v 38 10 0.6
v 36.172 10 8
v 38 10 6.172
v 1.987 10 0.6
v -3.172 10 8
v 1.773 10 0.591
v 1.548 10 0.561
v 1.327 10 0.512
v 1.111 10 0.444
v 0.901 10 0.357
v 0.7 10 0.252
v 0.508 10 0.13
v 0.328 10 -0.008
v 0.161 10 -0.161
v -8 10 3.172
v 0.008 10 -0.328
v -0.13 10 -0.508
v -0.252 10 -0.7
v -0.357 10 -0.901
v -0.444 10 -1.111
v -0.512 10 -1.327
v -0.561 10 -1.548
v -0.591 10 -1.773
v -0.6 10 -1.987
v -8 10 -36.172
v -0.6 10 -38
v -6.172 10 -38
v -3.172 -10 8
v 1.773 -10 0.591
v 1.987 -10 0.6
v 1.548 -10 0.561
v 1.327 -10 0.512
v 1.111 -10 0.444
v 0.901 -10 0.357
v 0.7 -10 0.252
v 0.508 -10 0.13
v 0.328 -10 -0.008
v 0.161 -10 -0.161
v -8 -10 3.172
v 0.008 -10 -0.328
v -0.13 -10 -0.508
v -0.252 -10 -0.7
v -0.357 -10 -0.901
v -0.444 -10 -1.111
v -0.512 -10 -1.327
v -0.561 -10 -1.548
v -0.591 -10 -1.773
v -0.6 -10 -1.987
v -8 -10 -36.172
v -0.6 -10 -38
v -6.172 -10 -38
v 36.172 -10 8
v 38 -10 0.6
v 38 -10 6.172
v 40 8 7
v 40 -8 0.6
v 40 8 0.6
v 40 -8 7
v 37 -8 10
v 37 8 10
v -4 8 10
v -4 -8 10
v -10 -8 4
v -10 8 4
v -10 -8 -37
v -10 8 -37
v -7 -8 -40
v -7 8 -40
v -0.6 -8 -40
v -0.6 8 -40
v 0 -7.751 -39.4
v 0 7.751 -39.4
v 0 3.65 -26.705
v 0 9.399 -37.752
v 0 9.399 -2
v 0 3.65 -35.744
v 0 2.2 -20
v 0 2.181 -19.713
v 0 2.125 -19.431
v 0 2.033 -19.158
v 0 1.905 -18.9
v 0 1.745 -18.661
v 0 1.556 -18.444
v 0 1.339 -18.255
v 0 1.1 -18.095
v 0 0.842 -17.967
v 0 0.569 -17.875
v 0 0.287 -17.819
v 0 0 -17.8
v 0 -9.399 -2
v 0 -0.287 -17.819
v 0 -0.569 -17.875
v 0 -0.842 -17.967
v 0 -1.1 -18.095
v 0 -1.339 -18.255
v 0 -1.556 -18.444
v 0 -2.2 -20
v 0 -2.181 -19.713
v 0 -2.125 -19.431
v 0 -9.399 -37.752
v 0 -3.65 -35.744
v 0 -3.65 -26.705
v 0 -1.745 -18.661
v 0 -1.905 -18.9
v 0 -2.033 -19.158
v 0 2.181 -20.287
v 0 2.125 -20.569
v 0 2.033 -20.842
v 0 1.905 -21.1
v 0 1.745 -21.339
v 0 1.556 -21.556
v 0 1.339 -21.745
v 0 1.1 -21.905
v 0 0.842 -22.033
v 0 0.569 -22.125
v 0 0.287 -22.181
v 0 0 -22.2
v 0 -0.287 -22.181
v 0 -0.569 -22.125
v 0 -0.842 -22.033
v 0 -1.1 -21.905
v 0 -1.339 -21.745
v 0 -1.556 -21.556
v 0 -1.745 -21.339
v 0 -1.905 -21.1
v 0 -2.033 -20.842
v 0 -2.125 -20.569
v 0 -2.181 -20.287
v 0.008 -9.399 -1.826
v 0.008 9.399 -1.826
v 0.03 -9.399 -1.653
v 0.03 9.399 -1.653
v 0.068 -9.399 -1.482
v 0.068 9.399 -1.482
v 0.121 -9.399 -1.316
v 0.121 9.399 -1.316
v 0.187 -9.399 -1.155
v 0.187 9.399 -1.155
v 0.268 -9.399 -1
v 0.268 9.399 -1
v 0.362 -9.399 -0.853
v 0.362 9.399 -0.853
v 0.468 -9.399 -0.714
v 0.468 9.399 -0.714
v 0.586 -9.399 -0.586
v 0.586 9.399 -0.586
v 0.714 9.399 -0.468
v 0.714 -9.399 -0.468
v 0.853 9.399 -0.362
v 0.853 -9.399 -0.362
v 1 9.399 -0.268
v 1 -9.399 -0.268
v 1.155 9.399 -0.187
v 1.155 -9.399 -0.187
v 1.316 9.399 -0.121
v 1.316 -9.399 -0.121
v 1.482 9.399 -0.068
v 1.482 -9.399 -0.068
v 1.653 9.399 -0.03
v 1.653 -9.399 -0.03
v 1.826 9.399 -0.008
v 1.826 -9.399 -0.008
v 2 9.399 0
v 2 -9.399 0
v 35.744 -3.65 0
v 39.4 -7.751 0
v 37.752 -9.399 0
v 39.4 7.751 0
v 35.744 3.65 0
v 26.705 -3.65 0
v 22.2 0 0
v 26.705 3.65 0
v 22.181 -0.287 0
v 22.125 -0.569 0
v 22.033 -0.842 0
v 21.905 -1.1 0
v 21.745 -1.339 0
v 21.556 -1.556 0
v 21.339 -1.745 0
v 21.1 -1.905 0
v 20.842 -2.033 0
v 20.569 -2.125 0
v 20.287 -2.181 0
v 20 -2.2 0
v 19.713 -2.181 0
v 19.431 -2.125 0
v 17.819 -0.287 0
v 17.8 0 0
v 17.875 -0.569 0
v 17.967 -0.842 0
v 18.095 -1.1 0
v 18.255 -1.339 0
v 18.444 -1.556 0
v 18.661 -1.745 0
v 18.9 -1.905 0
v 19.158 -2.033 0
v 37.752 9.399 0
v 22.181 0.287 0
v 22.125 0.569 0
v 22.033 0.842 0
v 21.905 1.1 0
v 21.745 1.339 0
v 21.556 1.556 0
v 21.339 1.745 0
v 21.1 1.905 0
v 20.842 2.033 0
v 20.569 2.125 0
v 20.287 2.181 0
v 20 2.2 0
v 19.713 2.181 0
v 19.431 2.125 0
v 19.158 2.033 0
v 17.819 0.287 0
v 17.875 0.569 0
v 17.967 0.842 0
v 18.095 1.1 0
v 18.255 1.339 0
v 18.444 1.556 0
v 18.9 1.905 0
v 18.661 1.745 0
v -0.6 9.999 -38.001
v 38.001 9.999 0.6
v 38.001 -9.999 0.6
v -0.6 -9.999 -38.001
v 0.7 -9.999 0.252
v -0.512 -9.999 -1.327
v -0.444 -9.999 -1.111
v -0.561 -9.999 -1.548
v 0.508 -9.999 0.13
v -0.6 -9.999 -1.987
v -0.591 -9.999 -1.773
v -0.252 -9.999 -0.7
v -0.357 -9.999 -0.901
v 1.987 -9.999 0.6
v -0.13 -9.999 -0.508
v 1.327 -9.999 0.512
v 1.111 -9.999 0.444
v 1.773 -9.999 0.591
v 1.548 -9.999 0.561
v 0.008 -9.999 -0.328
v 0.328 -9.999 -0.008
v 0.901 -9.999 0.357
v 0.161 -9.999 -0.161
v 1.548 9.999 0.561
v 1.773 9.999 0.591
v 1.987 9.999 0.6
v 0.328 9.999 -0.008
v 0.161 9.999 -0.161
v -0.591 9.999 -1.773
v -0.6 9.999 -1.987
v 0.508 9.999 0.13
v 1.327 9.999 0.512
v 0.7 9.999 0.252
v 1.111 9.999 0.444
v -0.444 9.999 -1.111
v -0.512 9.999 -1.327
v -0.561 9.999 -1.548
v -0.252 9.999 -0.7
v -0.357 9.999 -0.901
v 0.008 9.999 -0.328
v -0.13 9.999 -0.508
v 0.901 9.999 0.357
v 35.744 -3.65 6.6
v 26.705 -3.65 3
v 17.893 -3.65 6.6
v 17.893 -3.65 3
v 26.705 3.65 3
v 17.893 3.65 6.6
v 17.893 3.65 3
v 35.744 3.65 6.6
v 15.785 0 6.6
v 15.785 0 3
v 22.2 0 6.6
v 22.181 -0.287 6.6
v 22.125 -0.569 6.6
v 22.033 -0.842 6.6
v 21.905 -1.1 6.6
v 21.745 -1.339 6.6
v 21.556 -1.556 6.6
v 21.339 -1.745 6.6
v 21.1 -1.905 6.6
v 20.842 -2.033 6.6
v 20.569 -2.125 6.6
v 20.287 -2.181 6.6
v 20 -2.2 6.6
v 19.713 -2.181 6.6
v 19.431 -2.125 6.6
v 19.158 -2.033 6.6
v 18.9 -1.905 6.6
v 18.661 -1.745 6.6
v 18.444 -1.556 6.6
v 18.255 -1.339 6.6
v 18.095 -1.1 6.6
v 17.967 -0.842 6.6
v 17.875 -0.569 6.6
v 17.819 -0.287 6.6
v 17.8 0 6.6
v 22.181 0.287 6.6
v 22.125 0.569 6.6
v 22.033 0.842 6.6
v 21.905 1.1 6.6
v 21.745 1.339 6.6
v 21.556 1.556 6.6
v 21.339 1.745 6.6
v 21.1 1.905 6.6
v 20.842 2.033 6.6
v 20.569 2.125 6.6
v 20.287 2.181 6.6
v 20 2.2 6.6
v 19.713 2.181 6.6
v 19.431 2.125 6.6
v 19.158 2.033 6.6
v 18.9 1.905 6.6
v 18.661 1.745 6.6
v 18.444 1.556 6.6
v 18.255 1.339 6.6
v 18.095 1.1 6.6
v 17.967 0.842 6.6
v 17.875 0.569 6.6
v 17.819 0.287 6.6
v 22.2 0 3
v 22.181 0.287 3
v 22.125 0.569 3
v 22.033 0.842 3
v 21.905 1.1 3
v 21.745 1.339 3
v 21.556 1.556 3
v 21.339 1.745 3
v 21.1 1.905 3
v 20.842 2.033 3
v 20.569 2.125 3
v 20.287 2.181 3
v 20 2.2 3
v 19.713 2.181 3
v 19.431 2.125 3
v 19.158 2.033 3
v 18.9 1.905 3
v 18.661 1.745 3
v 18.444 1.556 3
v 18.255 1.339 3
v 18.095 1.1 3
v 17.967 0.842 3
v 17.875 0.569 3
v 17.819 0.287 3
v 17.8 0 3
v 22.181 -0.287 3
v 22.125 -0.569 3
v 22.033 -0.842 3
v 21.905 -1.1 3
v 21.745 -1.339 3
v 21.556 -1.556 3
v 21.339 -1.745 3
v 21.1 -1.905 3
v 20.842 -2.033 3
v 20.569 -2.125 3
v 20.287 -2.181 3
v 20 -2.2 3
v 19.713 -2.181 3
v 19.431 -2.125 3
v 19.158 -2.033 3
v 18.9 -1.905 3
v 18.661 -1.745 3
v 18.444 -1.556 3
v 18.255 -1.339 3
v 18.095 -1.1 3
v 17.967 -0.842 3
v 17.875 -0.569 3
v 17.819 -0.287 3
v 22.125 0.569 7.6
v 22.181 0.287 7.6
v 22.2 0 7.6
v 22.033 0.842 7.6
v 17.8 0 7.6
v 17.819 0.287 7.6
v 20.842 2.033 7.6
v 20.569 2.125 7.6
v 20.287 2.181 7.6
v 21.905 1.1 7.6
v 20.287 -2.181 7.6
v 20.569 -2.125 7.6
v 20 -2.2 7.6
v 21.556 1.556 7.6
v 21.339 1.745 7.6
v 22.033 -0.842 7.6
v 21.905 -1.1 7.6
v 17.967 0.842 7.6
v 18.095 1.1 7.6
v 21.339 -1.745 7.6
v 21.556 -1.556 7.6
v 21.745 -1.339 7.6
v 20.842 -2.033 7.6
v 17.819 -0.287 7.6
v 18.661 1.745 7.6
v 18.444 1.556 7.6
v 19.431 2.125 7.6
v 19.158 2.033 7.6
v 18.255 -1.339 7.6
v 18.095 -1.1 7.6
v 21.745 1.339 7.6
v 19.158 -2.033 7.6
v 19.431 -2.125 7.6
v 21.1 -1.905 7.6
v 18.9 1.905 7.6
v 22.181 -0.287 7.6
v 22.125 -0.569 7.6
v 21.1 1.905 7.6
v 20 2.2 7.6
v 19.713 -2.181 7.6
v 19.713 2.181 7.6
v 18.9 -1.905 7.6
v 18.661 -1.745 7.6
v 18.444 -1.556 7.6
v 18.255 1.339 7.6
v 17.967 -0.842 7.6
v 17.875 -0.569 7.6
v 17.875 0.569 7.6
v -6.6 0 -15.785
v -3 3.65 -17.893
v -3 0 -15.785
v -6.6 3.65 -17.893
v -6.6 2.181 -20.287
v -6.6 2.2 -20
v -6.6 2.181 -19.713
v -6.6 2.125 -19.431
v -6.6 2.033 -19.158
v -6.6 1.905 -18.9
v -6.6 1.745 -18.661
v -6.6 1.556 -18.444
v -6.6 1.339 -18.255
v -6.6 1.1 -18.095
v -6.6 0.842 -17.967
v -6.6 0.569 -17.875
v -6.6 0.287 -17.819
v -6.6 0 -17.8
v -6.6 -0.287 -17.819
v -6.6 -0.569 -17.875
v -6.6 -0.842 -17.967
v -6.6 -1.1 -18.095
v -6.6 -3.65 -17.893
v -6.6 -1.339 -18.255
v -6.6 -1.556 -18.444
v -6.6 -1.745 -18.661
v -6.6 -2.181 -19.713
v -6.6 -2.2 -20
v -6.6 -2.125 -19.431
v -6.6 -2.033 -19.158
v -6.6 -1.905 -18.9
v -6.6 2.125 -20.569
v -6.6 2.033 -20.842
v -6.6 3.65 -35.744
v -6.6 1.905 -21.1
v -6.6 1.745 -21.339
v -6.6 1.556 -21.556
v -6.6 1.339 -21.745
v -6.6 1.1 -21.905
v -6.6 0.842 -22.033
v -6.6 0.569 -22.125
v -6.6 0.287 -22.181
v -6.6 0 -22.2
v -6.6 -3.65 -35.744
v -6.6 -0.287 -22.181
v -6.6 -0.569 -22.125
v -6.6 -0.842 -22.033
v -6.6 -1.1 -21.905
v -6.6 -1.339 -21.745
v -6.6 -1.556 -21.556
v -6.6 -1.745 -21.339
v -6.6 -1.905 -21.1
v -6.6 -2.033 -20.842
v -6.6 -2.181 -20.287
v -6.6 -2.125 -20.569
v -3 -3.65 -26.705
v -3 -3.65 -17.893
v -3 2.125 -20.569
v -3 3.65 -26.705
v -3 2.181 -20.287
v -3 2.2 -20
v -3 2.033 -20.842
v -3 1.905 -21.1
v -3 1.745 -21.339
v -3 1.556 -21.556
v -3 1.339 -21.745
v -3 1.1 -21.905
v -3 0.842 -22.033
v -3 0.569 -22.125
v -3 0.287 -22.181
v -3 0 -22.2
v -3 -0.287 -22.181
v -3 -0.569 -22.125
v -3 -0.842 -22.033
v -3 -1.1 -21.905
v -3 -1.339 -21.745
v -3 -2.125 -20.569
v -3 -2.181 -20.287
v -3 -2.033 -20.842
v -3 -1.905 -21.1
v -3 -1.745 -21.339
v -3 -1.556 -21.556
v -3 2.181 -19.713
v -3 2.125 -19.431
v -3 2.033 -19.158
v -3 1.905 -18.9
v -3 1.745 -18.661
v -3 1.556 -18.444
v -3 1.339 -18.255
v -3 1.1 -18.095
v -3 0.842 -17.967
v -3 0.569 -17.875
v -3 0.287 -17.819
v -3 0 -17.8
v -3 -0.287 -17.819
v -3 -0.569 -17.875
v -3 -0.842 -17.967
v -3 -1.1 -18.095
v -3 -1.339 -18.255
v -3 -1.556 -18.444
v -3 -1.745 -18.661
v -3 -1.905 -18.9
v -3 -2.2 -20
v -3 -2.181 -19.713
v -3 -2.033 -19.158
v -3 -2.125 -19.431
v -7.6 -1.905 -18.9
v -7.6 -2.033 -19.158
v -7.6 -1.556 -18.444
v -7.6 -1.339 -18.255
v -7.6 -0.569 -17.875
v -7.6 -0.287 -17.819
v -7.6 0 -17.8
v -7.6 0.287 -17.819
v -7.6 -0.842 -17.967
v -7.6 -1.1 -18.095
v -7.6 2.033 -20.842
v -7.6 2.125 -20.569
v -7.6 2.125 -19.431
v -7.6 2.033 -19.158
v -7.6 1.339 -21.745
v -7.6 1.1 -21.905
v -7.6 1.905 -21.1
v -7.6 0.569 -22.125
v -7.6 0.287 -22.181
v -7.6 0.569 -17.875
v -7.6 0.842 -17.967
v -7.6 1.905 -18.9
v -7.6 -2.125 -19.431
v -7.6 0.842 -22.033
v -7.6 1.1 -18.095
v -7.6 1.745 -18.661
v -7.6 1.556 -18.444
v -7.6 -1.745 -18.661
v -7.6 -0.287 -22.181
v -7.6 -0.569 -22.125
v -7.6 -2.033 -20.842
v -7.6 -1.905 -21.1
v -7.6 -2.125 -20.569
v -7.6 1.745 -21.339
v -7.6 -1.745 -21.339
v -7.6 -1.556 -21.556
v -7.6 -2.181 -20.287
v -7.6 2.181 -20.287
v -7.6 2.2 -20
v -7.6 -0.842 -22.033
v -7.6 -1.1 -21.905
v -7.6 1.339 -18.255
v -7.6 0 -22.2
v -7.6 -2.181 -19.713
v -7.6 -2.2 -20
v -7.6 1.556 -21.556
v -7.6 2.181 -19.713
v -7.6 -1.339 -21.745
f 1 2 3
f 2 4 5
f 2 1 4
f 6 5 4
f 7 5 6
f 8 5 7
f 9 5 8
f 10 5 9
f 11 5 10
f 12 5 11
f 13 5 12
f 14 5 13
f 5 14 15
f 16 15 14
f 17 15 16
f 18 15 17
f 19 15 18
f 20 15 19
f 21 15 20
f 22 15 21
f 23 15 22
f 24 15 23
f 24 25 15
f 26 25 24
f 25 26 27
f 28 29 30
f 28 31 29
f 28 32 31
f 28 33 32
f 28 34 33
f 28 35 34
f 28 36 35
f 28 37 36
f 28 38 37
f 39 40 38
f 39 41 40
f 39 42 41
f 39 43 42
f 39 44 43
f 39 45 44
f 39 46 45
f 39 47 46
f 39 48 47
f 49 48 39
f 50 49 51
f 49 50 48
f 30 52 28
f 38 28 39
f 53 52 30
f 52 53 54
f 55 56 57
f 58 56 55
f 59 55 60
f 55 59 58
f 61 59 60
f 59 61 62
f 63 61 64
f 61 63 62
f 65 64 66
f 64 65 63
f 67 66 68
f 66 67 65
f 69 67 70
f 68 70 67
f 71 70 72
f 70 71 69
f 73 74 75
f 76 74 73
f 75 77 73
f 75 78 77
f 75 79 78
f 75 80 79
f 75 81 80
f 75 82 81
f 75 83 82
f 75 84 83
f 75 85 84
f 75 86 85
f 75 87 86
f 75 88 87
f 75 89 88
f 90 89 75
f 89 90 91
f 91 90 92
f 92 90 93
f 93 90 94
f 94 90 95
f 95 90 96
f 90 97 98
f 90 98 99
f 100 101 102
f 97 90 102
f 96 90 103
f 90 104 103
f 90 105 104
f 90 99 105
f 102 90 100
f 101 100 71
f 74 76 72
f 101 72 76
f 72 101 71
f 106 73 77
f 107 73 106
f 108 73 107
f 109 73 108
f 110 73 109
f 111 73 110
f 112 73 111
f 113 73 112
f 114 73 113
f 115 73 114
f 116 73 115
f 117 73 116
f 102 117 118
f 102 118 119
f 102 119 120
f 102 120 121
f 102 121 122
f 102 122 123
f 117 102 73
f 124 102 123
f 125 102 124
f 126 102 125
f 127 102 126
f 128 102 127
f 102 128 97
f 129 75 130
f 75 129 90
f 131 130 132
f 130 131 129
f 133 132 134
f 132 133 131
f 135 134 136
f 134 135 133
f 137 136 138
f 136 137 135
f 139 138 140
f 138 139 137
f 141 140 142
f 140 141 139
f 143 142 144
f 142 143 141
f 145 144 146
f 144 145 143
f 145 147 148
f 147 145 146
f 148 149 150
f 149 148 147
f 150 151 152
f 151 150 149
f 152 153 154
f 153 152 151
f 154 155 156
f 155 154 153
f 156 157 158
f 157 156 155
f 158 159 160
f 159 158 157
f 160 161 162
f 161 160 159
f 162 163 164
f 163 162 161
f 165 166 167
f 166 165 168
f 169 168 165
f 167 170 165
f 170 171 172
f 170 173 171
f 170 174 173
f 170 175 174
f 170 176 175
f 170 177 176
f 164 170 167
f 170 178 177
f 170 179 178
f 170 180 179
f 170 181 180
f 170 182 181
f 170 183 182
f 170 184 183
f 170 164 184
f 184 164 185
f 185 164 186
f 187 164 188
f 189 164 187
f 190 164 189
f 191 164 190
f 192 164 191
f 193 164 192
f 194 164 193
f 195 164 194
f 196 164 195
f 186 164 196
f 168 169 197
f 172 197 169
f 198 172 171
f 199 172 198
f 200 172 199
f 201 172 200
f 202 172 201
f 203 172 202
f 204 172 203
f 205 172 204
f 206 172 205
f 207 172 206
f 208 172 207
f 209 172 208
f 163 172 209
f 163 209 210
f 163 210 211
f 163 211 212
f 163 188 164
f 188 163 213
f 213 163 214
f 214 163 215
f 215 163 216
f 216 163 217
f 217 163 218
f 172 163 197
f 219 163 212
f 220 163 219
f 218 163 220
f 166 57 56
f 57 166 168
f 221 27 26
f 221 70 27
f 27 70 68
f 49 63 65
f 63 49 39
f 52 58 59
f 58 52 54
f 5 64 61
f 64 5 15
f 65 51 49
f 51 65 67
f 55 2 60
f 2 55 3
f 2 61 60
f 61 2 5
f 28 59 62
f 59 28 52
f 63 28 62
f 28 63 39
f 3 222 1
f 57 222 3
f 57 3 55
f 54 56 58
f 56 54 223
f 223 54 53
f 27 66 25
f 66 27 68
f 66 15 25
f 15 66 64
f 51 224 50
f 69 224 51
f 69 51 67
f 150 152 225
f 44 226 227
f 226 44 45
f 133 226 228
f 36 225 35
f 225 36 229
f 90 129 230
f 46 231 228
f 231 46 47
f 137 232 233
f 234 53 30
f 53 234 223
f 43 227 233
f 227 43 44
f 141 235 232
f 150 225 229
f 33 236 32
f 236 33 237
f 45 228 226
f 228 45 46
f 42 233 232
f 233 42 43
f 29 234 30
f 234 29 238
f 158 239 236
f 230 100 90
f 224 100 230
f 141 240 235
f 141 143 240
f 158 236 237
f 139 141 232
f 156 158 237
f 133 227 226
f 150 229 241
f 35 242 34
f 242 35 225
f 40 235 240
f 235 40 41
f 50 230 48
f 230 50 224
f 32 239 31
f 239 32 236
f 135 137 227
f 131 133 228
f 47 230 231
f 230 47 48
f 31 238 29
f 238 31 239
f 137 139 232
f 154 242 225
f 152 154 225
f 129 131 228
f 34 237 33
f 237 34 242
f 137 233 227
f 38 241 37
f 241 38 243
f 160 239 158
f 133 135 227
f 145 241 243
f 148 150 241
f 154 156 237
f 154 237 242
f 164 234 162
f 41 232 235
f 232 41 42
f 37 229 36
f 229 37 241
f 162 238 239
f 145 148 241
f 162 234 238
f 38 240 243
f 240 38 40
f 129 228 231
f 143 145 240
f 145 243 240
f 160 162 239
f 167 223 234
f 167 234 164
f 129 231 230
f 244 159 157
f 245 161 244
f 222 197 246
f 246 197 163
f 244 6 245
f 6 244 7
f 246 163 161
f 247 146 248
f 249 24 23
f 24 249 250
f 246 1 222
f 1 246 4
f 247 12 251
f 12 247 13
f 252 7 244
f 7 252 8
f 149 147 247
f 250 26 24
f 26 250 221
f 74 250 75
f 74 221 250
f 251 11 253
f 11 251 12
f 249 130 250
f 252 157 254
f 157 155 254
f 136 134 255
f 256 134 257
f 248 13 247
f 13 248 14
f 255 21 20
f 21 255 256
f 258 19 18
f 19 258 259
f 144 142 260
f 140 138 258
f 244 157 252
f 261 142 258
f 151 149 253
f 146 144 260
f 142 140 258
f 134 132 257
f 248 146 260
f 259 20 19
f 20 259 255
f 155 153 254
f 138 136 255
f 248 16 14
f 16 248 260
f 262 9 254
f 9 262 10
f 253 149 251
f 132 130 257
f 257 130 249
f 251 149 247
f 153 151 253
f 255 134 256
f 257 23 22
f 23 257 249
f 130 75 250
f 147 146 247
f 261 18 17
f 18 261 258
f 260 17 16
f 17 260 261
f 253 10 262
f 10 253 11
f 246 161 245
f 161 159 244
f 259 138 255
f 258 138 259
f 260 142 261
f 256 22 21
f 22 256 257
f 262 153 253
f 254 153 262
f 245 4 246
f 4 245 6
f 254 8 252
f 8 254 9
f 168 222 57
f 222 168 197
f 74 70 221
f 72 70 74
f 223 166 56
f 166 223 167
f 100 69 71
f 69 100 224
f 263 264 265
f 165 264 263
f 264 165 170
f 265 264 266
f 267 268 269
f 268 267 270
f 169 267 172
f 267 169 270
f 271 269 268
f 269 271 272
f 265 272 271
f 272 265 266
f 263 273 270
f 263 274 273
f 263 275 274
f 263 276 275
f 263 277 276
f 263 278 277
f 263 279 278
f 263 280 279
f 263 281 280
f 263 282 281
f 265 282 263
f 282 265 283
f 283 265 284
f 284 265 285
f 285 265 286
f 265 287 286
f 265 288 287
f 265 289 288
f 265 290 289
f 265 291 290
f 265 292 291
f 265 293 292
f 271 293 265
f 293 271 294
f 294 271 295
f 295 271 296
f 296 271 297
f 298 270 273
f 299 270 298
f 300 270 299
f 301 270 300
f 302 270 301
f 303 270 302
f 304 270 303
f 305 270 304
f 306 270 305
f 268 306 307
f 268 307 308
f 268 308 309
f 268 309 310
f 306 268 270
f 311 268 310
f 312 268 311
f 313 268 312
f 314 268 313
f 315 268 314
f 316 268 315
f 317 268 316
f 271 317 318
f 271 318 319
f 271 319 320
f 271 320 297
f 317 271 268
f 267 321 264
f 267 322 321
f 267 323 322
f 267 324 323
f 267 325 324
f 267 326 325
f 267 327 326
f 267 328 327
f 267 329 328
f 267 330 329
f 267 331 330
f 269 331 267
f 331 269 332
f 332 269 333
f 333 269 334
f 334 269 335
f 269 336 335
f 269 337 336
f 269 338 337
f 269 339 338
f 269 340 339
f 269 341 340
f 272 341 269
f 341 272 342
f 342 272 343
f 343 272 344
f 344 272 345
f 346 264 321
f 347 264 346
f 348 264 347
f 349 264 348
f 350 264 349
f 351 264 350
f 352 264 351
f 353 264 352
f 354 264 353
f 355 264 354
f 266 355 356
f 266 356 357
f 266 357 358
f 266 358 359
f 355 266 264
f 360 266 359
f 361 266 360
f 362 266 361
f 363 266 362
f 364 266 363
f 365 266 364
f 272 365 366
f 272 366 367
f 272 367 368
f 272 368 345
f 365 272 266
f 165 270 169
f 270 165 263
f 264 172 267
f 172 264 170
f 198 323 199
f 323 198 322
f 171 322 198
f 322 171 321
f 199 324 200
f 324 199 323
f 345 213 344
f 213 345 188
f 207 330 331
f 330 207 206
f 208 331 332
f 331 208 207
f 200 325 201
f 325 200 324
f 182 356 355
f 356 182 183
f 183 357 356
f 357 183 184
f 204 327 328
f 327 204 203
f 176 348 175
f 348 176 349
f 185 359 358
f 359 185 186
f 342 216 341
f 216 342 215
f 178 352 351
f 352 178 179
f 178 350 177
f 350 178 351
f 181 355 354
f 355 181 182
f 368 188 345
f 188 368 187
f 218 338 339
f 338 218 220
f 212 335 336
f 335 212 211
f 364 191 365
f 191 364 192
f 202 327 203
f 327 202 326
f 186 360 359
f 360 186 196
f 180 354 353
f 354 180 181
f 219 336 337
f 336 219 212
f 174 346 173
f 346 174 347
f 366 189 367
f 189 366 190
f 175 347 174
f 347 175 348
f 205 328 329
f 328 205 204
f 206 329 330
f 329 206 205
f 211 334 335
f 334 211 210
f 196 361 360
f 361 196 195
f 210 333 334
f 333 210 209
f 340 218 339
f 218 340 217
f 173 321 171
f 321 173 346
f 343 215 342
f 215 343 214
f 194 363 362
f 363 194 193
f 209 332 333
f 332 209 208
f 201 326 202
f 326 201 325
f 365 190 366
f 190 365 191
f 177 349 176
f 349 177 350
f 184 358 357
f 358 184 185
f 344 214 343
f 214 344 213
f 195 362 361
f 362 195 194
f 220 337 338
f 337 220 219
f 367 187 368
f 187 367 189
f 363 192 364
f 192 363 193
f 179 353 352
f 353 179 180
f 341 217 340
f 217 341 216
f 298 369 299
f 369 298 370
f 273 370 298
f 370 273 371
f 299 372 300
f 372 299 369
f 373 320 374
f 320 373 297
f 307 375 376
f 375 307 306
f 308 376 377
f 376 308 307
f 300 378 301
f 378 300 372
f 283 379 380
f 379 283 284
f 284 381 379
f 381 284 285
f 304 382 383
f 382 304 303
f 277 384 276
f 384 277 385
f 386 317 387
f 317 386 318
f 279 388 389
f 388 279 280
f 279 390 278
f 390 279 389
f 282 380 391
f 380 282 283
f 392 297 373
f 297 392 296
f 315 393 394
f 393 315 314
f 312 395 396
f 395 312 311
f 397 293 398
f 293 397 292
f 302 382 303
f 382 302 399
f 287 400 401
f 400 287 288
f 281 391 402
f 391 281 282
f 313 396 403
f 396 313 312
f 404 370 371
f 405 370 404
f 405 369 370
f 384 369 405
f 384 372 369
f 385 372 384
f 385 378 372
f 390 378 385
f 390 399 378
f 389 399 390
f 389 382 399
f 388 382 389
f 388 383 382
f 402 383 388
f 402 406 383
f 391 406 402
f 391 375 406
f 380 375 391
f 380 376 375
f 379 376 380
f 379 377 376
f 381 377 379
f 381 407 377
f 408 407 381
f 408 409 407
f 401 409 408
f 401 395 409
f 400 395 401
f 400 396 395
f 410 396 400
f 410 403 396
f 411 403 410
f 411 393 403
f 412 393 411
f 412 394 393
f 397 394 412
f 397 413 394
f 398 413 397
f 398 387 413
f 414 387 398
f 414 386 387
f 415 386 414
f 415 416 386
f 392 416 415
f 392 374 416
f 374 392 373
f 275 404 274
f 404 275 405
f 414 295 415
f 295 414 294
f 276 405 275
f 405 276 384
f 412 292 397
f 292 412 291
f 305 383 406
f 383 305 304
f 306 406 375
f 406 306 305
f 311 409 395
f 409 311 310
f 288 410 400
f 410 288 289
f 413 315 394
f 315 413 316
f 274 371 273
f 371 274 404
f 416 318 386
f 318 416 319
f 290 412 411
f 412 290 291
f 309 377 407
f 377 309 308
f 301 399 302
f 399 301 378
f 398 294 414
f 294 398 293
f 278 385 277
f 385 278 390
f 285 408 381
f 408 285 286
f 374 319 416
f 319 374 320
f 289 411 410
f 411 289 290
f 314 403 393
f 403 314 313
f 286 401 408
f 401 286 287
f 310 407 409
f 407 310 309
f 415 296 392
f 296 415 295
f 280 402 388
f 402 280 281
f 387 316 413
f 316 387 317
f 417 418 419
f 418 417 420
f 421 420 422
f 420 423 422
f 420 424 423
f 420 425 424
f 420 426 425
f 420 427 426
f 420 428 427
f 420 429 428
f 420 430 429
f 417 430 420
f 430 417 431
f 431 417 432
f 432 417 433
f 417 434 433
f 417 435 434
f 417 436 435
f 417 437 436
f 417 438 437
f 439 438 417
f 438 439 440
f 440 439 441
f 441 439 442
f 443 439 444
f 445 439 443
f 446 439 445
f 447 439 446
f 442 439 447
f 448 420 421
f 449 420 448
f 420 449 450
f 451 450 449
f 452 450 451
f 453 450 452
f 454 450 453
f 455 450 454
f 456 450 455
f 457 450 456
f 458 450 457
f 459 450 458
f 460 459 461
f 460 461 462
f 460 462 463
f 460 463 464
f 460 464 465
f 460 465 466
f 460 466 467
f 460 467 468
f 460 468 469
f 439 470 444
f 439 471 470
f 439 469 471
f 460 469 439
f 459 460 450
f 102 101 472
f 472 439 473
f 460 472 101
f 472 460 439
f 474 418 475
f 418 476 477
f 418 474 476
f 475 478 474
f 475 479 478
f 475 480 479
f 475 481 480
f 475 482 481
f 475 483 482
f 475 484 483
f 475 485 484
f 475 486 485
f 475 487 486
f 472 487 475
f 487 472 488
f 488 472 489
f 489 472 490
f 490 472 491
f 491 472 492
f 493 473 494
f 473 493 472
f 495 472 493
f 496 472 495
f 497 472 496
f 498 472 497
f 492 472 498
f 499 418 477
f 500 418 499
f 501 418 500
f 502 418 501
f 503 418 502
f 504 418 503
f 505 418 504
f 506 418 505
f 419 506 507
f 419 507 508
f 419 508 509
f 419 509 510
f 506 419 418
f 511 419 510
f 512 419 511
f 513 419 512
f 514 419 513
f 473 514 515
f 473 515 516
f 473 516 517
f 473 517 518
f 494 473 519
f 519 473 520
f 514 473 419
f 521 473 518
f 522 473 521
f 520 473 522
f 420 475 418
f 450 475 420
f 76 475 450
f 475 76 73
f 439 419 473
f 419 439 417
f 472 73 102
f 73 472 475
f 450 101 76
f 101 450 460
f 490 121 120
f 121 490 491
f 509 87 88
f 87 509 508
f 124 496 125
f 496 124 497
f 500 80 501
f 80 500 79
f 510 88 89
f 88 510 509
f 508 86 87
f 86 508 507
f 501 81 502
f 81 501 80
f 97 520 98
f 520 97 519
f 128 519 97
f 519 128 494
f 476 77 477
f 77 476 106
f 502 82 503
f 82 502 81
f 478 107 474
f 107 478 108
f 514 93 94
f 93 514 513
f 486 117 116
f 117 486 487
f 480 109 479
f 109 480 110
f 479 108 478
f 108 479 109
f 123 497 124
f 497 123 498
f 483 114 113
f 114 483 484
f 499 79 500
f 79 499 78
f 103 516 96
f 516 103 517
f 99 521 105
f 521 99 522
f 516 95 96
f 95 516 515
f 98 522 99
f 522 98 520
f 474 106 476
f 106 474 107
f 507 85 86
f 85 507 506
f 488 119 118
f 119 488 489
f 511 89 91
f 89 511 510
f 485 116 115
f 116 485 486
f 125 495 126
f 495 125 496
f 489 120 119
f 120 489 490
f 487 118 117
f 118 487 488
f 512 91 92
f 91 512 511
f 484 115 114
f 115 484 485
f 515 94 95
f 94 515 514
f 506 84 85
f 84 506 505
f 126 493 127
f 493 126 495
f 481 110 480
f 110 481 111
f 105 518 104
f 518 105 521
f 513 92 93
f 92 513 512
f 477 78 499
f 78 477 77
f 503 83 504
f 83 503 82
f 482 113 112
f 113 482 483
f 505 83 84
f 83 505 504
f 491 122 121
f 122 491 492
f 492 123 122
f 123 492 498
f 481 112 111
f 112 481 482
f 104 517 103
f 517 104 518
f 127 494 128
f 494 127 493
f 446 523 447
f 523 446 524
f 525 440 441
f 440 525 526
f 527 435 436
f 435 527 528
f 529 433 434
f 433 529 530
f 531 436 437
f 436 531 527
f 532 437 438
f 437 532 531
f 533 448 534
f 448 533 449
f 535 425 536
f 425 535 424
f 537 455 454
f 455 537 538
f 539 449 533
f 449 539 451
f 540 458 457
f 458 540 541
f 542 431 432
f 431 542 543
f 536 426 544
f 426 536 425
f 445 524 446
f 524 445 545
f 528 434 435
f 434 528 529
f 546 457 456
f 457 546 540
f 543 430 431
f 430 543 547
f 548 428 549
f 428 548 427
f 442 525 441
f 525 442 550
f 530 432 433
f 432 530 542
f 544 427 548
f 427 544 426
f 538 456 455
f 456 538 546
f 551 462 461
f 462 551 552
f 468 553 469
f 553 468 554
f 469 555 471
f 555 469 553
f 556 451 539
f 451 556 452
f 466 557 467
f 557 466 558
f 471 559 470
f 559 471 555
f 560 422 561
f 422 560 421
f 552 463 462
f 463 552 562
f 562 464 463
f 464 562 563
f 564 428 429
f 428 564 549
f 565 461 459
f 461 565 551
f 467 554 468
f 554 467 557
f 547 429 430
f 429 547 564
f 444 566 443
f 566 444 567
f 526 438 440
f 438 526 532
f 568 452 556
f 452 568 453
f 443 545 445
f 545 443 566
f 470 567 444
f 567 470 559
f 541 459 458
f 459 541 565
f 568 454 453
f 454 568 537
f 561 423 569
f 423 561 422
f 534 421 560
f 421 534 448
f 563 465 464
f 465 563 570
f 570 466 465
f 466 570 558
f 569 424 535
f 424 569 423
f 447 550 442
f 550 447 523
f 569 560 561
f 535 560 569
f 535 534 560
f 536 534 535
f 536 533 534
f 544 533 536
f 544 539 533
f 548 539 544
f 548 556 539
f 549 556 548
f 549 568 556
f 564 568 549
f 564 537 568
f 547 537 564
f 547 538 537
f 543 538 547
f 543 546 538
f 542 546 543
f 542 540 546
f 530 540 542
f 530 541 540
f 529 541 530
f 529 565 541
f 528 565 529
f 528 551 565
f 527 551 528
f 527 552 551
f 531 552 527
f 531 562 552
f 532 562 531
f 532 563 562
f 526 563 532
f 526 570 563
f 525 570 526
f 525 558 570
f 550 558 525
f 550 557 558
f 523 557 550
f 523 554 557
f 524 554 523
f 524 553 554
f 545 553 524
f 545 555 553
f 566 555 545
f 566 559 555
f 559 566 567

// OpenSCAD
// file: inspection.scad
// Optional section clipping for OpenSCAD Customizer inspection.
// The bracket's default "None" mode passes the geometry through unchanged.
// For X/Y/Z, intersect geometry with a slab of the requested depth in mm.
module util_section_inspect(axis = "None", position_mm = 0, depth_mm = 10, direction = "Positive") {
    if (axis == "None")
        children();
    else {
        extent = 10000;
        low = (direction == "Negative") ? position_mm - depth_mm : position_mm;
        intersection() {
            children();
            if (axis == "X")
                translate([low, -extent / 2, -extent / 2])
                    cube([depth_mm, extent, extent]);
            else if (axis == "Y")
                translate([-extent / 2, low, -extent / 2])
                    cube([extent, depth_mm, extent]);
            else if (axis == "Z")
                translate([-extent / 2, -extent / 2, low])
                    cube([extent, extent, depth_mm]);
        }
    }
}
// main file
// Outside-corner L bracket for plywood joints.
// All dimensions are in millimetres. Adjust settings in the OpenSCAD Customizer.
//
// Side view (X to the right, Z upwards), with wood inside the bracket:
//
//     ____________________        <- bracket, top arm (outside the horizontal panel)
//    /  ##################
//   |  ||==================      <- horizontal plywood panel (10 mm)
//   |  ||
//   |  ||  vertical plywood panel
//   |  ||
//    bracket, vertical arm (outside the upright panel)
//
// Bolts enter from inside the plywood and thread into captive nuts in the bracket.
// Insert a nut through the access window on the wood-facing side of the bracket,
// slide it under the 3 mm retaining wall and push it against the stop.
// Hook the plug tab under the retaining lip, then press the opposite end down.
// The plywood covers the window; the outside face of the bracket stays solid.
//
// PRINTING: put the bracket on one flat side and the plugs on their sides.
// This lets layer lines follow the part outlines for improved strength.
//
// Requires inspection.scad in this directory for the optional section view.

use <inspection.scad>

/* [Display] */
part       = "bracket"; // [bracket, plug]
show_wood  = true;     // translucent plywood preview; excluded from STL
show_plugs = false;    // display fitted plugs; excluded from STL
part_color = [0.29, 0.56, 0.72]; // color
plug_color = [0.93, 0.58, 0.22]; // color

/* [Section inspection] */
c_section_axis        = "None";     // [None, X, Y, Z]
c_section_position_mm = 0;          // [-60:0.5:60]
c_section_depth_mm    = 10;         // [0.1:0.1:80]
c_section_direction   = "Positive"; // [Positive, Negative]

/* [Plywood] */
ply_t    = 10;     // plywood thickness
wood_w   = 60;     // panel width, display only
wood_len = 80;     // panel length, display only

/* [Bracket geometry] */
W        = 20;     // bracket width
t        = 10;     // bracket wall thickness
armH     = 40;     // length of top arm from the outer plywood end
armV     = 40;     // length of vertical arm from the top of horizontal plywood
ce       = 6;      // 45-degree outer corner chamfer (6 gives 9.9 mm diagonal wall)
c        = 3;      // 45-degree chamfer at outer arm ends
cs       = 2;      // 45-degree side-edge chamfers; 0 disables

/* [Print compensation] */
ef       = 0.6;    // 45-degree elephant-foot relief on print-facing sides; 0 disables
ef_corner_correction = true; // add the small arm-tip correction where ef meets cs
r_in     = 2.0;    // inside corner radius: plywood must be rounded at least this much; 0 or >=1

/* [Bolt and captive nut] */
bolt_edge = 10;    // bolt position beyond the inner face of the other panel
nut_type  = "hex"; // [hex, square]
bolt_d    = 4;
bolt_clr  = 0.4;   // bolt-hole clearance
nut_flats = 7;     // M4 nut across flats; measure your actual nuts
nut_h     = 3.2;   // nominal M4 nut thickness
nut_clr   = 0.3;   // captive-nut pocket clearance
wood_wall = 3;     // load-bearing wall between plywood and nut
tip_hole  = 1;     // blind hole for extra bolt length beyond the nut
                   // (M4x16 nominal fit; outer skin = t - wood_wall - pocket_h - tip_hole)

/* [Window plug] */
plug_clr    = 0.15; // clearance around access plug
lip_len     = 2.5;  // free slot from captive nut to window for plug's hooked tab
lip_thk     = 2.4;  // tab thickness
win_extra   = 0.6;  // extra window length to allow angled plug insertion
plug_ch     = 1.0;  // 45-degree bevel on far end of plug for insertion
plug_handle = "hole"; // [hole, slot, none] hole = pin/screw opening, slot = screwdriver notch

/* [Hidden] */
$fn = 48;

// ---------- Derived dimensions ----------
Wn       = nut_flats + nut_clr;   // nut pocket width (across flats)
Ln       = (nut_type == "hex") ? Wn / cos(30) : Wn;   // pocket length (hex vertex-to-vertex)
pocket_h = nut_h + 0.4;           // nut-pocket depth
skin     = t - wood_wall - pocket_h - tip_hole;   // closed outside wall
D        = wood_wall + pocket_h;  // window depth from wood-facing surface
Lw       = Ln + win_extra;        // window length
lip_l    = lip_len - 0.2;         // plug tab length

hx = ply_t + bolt_edge;           // top-arm bolt X position
vz = -(ply_t + bolt_edge);        // vertical-arm bolt Z position
tip_x = hx + Ln / 2 + lip_len;    // top-arm window start
tip_z = vz - Ln / 2 - lip_len;    // vertical-arm window start

echo("Outer skin behind nut (mm):", skin);
echo("Window end (mm):", tip_x + Lw, " arm length:", armH);

// ---------- Plywood preview (joint corner at origin) ----------
module wood() {
    color("burlywood", 0.45) difference() {
        union() {
            translate([0, -wood_w / 2, -ply_t]) cube([wood_len, wood_w, ply_t]);
            translate([0, -wood_w / 2, -wood_len]) cube([ply_t, wood_w, wood_len - ply_t]);
        }
        translate([hx, 0, -ply_t - 1]) cylinder(d = bolt_d + bolt_clr, h = ply_t + 2);
        translate([-1, 0, vz]) rotate([0, 90, 0]) cylinder(d = bolt_d + bolt_clr, h = ply_t + 2);
        // Remove material at the inside corner to match the bracket radius.
        if (r_in > 0) difference() {
            translate([-1, -wood_w / 2 - 1, -r_in]) cube([r_in + 1, wood_w + 2, r_in + 1]);
            translate([r_in, 0, -r_in]) rotate([90, 0, 0]) cylinder(r = r_in, h = wood_w + 4, center = true);
        }
    }
}

// ---------- Bracket side profile ----------
// Make the inside fillet from ordinary 2D shapes, before extrusion.
// The square sits in the open part of the L, at the sharp inner corner.
// Subtracting a circle leaves only the small curved region to add.
// Keep 72 segments (5 degrees each) to match the legacy 19-point arc.
module inside_corner_2d(r) {
    difference() {
        translate([0, -r]) square([r, r]);
        translate([r, -r]) circle(r = r, $fn = 72);
    }
}

// End edges also receive elephant-foot relief so the wood-facing bevel
// continues around side edges, ends, and the inside corner.
tip_top  = (ef > 0) ? [[armH - ef, 0], [armH, ef]] : [[armH, 0]];
tip_vert = (ef > 0) ? [[-ef, -armV], [0, -armV + ef]] : [[0, -armV]];

// Draw the unchanged L outline with a sharp inside corner at (0,0).
// The arm-end and outside-corner chamfers are part of this outline.
module sharp_profile() {
    polygon(concat(tip_top, [
        [armH, t - c],            // 45-degree top-arm end
        [armH - c, t],
        [-t + ce, t],
        [-t, t - ce],             // 45-degree outside corner
        [-t, -armV + c],
        [-t + c, -armV]           // 45-degree vertical-arm end
    ], tip_vert, [[0, 0]]));
}

// Complete the side profile in 2D, then extrude it in profile_extrusion().
// Radius zero leaves the original sharp corner without creating a square.
module profile() {
    union() {
        sharp_profile();
        if (r_in > 0) inside_corner_2d(r_in);
    }
}

// Convex envelope of the bracket with its inside corner filled in. Side
// chamfers affect the outer edges only; the wood-facing area stays flat.
module outer_shape() {
    polygon([
        [armH, -armV], [armH, t - c], [armH - c, t], [-t + ce, t],
        [-t, t - ce], [-t, -armV + c], [-t + c, -armV]
    ]);
}

module side_chamfer_env() {
    rotate([90, 0, 0]) hull() {
        linear_extrude(height = W - 2 * cs, center = true) outer_shape();
        linear_extrude(height = W, center = true) offset(delta = -cs) outer_shape();
    }
}

// Plain extruded side profile before side chamfers or pockets.
module profile_extrusion() {
    rotate([90, 0, 0])
        linear_extrude(height = W, center = true)
            profile();
}

module body() {
    intersection() {
        rotate([90, 0, 0]) linear_extrude(height = W, center = true) profile();
        if (cs > 0) side_chamfer_env();
        else rotate([90, 0, 0]) linear_extrude(height = W, center = true) outer_shape();
    }
}

// ---------- Unified hull-based side chamfers and print relief ----------
// The broad outside edges are controlled by side_chamfer_env() above.
// For the *concave*, wood-facing edges, use the complement: the open
// quadrant between the two arms, less the small rounded corner fill.
// Its boundary includes both straight contact faces and the inner arc.
// We extend the quadrant beyond the arm ends so the bevel is not clipped.
module inside_opening_2d() {
    reach = max(5, cs + ef + 1);
    difference() {
        translate([0, -armV - reach])
            square([armH + reach, armV + reach]);
        if (r_in > 0)
            inside_corner_2d(r_in);
    }
}

// A thin 3D slice of the open space at one position across the Y width.
// A larger 2D opening at the printed side removes an ef-sized amount
// from the wood-contact boundary without changing the middle of the part.
module opening_layer(y, expansion = 0) {
    translate([0, y, 0])
        rotate([90, 0, 0])
            linear_extrude(height = 0.002, center = true)
                offset(delta = expansion)
                    inside_opening_2d();
}

// Why TWO hulls? A single convex hull joining expanded openings at BOTH
// outside Y faces would also enlarge the opening all through the middle.
// Each side must have its own local transition from normal to expanded.
module inside_relief_envelope() {
    if (ef > 0)
        for (side = [-1, 1])
            hull() {
                opening_layer(side * (W / 2 - ef));
                opening_layer(side * W / 2, ef);
            }
}

// At each arm tip the EF chamfer meets the *diagonal* cs side chamfer.
// The opening hull above follows the straight plywood faces and the inside
// radius, but does not provide this third diagonal miter. This leaves a
// short, flat termination (visible at the corner in the 3D preview).
// Connect a triangular relief profile at BOTH ends of each diagonal edge
// with another local hull(), so the bevel continues through the junction.
// A profile is only 0.001 mm thick; the hull supplies the swept volume.
module relief_miter_hull(A, U, V, D, len) {
    module triangle_at(distance) {
        multmatrix([[U[0], V[0], D[0], A[0]],
                    [U[1], V[1], D[1], A[1]],
                    [U[2], V[2], D[2], A[2]],
                    [0, 0, 0, 1]])
            translate([0, 0, distance])
                linear_extrude(height = 0.001)
                    polygon([[-ef - 1, -1], [1, -1], [1, ef + 1]]);
    }
    hull() {
        triangle_at(0);
        triangle_at(len);
    }
}

// One diagonal junction at each end of each arm, repeated on both print
// faces. The rest of the elephant-foot relief still uses the two opening
// hulls, including the curved inside corner.
module relief_corner_miters() {
    s2 = sqrt(2) / 2;
    if (ef > 0 && cs > 0)
        for (m = [0, 1]) mirror([0, m, 0]) {
            // Horizontal arm: diagonal across the side bevel near x=armH.
            relief_miter_hull([armH - cs - s2, W / 2 + s2, 0],
                              [s2, s2, 0], [0, 0, 1], [s2, -s2, 0],
                              cs * sqrt(2) + 2);
            // Upright arm: equivalent junction near z=-armV.
            relief_miter_hull([0, W / 2 - cs - s2, -armV - s2],
                              [0, s2, -s2], [-1, 0, 0], [0, s2, s2],
                              cs * sqrt(2) + 2);
        }
}

// Keep the two broad inside-opening hulls and add local hulls at the
// arm-tip/side-chamfer junctions. No per-edge wedge extrusions are needed.
module chamfered_body() {
    difference() {
        body();
        if (ef > 0) {
            inside_relief_envelope();
            if (ef_corner_correction)
                relief_corner_miters();
        }
    }
}

// ---------- Captive-nut pocket with window on wood-facing side ----------
// The nut pocket lies behind wood_wall. A free slot connects the pocket
// to the access window. Slide the nut through the window towards the corner,
// then hook the plug tab into the slot.

// Top arm: bolt along Z.
module nut_top() {
    z0 = wood_wall;
    if (nut_type == "hex") {
        translate([hx, 0, z0]) cylinder(d = Ln, h = pocket_h, $fn = 6);
        translate([hx, -Wn / 2, z0]) cube([Ln / 2 + lip_len + 0.02, Wn, pocket_h]);
    } else
        translate([hx - Ln / 2, -Wn / 2, z0]) cube([Ln + lip_len + 0.02, Wn, pocket_h]);
    // Window opening from the wood-facing surface.
    translate([tip_x - 0.01, -Wn / 2, -0.01]) cube([Lw + 0.01, Wn, D + 0.01]);
    // Bolt hole through retaining wall plus blind clearance behind nut.
    translate([hx, 0, -1]) cylinder(d = bolt_d + bolt_clr, h = wood_wall + 2);
    translate([hx, 0, z0 + pocket_h - 0.01]) cylinder(d = bolt_d + bolt_clr, h = tip_hole + 0.01);
}

// Vertical arm: bolt along X.
module nut_side() {
    x0 = -D;
    if (nut_type == "hex") {
        translate([x0, 0, vz]) rotate([0, 90, 0]) cylinder(d = Ln, h = pocket_h, $fn = 6);
        translate([x0, -Wn / 2, tip_z - 0.02]) cube([pocket_h, Wn, Ln / 2 + lip_len + 0.02]);
    } else
        translate([x0, -Wn / 2, tip_z - 0.02]) cube([pocket_h, Wn, Ln + lip_len + 0.02]);
    // Window opening from the wood-facing surface.
    translate([x0, -Wn / 2, tip_z - Lw]) cube([D + 0.01, Wn, Lw + 0.01]);
    // Bolt hole through retaining wall plus blind clearance behind nut.
    translate([1, 0, vz]) rotate([0, -90, 0]) cylinder(d = bolt_d + bolt_clr, h = wood_wall + 2);
    translate([x0 + 0.01, 0, vz]) rotate([0, -90, 0]) cylinder(d = bolt_d + bolt_clr, h = tip_hole + 0.01);
}

module bracket() {
    difference() {
        chamfered_body();
        nut_top();
        nut_side();
    }
}

// ---------- Access-window plug ----------
// Window-local coordinates: u runs along the arm towards its end (0=start),
// v is transverse (Y), and w is depth from the wood-facing surface.
// The tab at u<0 engages the slot under the retaining wall.
// Insert the tab at an angle, then press the far end flush with the wood face.
module plug_local() {
    pc = plug_clr;
    pw = Wn - 2 * pc;
    difference() {
        rotate([90, 0, 0]) linear_extrude(height = pw, center = true)
            polygon([
                [pc, 0], [Lw - pc, 0],
                [Lw - pc, D - pc - plug_ch], [Lw - pc - plug_ch, D - pc],   // insertion bevel
                [-lip_l, D - pc],                                           // bottom face and tab
                [-lip_l, D - pc - lip_thk], [pc, D - pc - lip_thk]
            ]);
        // Extraction hole (pin/small screw) or screwdriver slot.
        if (plug_handle == "hole") translate([Lw / 2, 0, -1]) cylinder(d = 2.5, h = 5, $fn = 24);
        if (plug_handle == "slot") translate([Lw - pc - 3, -pw / 2 - 1, -1]) cube([1.2, pw + 2, 3]);
    }
}

// Lay plugs on their sides for printing; layer lines run through each tab.
module plug_print() {
    translate([lip_l, D, (Wn - 2 * plug_clr) / 2]) rotate([90, 0, 0]) plug_local();
}

// Two separate plugs positioned for printing and documentation exports.
module plugs_print_pair() {
    for (i = [0, 1])
        translate([i * (Lw + lip_l + 4), 0, 0])
            plug_print();
}

// Show installed plugs in the access windows for visual inspection only.
module plugs_in_place() {
    translate([tip_x, 0, 0]) plug_local();
    multmatrix([[0, 0, -1, 0], [0, -1, 0, 0], [-1, 0, 0, tip_z], [0, 0, 0, 1]]) plug_local();
}

// ===== DISPLAY / PRINT-PART SELECTOR =====
if (part == "plug") {
    util_section_inspect(c_section_axis, c_section_position_mm, c_section_depth_mm, c_section_direction)
        color(plug_color)
            plugs_print_pair();
} else {
    util_section_inspect(c_section_axis, c_section_position_mm, c_section_depth_mm, c_section_direction)
        color(part_color) bracket();
    if (show_wood)
        %util_section_inspect(c_section_axis, c_section_position_mm, c_section_depth_mm, c_section_direction)
            wood();
    if (show_plugs)
        %util_section_inspect(c_section_axis, c_section_position_mm, c_section_depth_mm, c_section_direction)
            color(plug_color) plugs_in_place();
}
